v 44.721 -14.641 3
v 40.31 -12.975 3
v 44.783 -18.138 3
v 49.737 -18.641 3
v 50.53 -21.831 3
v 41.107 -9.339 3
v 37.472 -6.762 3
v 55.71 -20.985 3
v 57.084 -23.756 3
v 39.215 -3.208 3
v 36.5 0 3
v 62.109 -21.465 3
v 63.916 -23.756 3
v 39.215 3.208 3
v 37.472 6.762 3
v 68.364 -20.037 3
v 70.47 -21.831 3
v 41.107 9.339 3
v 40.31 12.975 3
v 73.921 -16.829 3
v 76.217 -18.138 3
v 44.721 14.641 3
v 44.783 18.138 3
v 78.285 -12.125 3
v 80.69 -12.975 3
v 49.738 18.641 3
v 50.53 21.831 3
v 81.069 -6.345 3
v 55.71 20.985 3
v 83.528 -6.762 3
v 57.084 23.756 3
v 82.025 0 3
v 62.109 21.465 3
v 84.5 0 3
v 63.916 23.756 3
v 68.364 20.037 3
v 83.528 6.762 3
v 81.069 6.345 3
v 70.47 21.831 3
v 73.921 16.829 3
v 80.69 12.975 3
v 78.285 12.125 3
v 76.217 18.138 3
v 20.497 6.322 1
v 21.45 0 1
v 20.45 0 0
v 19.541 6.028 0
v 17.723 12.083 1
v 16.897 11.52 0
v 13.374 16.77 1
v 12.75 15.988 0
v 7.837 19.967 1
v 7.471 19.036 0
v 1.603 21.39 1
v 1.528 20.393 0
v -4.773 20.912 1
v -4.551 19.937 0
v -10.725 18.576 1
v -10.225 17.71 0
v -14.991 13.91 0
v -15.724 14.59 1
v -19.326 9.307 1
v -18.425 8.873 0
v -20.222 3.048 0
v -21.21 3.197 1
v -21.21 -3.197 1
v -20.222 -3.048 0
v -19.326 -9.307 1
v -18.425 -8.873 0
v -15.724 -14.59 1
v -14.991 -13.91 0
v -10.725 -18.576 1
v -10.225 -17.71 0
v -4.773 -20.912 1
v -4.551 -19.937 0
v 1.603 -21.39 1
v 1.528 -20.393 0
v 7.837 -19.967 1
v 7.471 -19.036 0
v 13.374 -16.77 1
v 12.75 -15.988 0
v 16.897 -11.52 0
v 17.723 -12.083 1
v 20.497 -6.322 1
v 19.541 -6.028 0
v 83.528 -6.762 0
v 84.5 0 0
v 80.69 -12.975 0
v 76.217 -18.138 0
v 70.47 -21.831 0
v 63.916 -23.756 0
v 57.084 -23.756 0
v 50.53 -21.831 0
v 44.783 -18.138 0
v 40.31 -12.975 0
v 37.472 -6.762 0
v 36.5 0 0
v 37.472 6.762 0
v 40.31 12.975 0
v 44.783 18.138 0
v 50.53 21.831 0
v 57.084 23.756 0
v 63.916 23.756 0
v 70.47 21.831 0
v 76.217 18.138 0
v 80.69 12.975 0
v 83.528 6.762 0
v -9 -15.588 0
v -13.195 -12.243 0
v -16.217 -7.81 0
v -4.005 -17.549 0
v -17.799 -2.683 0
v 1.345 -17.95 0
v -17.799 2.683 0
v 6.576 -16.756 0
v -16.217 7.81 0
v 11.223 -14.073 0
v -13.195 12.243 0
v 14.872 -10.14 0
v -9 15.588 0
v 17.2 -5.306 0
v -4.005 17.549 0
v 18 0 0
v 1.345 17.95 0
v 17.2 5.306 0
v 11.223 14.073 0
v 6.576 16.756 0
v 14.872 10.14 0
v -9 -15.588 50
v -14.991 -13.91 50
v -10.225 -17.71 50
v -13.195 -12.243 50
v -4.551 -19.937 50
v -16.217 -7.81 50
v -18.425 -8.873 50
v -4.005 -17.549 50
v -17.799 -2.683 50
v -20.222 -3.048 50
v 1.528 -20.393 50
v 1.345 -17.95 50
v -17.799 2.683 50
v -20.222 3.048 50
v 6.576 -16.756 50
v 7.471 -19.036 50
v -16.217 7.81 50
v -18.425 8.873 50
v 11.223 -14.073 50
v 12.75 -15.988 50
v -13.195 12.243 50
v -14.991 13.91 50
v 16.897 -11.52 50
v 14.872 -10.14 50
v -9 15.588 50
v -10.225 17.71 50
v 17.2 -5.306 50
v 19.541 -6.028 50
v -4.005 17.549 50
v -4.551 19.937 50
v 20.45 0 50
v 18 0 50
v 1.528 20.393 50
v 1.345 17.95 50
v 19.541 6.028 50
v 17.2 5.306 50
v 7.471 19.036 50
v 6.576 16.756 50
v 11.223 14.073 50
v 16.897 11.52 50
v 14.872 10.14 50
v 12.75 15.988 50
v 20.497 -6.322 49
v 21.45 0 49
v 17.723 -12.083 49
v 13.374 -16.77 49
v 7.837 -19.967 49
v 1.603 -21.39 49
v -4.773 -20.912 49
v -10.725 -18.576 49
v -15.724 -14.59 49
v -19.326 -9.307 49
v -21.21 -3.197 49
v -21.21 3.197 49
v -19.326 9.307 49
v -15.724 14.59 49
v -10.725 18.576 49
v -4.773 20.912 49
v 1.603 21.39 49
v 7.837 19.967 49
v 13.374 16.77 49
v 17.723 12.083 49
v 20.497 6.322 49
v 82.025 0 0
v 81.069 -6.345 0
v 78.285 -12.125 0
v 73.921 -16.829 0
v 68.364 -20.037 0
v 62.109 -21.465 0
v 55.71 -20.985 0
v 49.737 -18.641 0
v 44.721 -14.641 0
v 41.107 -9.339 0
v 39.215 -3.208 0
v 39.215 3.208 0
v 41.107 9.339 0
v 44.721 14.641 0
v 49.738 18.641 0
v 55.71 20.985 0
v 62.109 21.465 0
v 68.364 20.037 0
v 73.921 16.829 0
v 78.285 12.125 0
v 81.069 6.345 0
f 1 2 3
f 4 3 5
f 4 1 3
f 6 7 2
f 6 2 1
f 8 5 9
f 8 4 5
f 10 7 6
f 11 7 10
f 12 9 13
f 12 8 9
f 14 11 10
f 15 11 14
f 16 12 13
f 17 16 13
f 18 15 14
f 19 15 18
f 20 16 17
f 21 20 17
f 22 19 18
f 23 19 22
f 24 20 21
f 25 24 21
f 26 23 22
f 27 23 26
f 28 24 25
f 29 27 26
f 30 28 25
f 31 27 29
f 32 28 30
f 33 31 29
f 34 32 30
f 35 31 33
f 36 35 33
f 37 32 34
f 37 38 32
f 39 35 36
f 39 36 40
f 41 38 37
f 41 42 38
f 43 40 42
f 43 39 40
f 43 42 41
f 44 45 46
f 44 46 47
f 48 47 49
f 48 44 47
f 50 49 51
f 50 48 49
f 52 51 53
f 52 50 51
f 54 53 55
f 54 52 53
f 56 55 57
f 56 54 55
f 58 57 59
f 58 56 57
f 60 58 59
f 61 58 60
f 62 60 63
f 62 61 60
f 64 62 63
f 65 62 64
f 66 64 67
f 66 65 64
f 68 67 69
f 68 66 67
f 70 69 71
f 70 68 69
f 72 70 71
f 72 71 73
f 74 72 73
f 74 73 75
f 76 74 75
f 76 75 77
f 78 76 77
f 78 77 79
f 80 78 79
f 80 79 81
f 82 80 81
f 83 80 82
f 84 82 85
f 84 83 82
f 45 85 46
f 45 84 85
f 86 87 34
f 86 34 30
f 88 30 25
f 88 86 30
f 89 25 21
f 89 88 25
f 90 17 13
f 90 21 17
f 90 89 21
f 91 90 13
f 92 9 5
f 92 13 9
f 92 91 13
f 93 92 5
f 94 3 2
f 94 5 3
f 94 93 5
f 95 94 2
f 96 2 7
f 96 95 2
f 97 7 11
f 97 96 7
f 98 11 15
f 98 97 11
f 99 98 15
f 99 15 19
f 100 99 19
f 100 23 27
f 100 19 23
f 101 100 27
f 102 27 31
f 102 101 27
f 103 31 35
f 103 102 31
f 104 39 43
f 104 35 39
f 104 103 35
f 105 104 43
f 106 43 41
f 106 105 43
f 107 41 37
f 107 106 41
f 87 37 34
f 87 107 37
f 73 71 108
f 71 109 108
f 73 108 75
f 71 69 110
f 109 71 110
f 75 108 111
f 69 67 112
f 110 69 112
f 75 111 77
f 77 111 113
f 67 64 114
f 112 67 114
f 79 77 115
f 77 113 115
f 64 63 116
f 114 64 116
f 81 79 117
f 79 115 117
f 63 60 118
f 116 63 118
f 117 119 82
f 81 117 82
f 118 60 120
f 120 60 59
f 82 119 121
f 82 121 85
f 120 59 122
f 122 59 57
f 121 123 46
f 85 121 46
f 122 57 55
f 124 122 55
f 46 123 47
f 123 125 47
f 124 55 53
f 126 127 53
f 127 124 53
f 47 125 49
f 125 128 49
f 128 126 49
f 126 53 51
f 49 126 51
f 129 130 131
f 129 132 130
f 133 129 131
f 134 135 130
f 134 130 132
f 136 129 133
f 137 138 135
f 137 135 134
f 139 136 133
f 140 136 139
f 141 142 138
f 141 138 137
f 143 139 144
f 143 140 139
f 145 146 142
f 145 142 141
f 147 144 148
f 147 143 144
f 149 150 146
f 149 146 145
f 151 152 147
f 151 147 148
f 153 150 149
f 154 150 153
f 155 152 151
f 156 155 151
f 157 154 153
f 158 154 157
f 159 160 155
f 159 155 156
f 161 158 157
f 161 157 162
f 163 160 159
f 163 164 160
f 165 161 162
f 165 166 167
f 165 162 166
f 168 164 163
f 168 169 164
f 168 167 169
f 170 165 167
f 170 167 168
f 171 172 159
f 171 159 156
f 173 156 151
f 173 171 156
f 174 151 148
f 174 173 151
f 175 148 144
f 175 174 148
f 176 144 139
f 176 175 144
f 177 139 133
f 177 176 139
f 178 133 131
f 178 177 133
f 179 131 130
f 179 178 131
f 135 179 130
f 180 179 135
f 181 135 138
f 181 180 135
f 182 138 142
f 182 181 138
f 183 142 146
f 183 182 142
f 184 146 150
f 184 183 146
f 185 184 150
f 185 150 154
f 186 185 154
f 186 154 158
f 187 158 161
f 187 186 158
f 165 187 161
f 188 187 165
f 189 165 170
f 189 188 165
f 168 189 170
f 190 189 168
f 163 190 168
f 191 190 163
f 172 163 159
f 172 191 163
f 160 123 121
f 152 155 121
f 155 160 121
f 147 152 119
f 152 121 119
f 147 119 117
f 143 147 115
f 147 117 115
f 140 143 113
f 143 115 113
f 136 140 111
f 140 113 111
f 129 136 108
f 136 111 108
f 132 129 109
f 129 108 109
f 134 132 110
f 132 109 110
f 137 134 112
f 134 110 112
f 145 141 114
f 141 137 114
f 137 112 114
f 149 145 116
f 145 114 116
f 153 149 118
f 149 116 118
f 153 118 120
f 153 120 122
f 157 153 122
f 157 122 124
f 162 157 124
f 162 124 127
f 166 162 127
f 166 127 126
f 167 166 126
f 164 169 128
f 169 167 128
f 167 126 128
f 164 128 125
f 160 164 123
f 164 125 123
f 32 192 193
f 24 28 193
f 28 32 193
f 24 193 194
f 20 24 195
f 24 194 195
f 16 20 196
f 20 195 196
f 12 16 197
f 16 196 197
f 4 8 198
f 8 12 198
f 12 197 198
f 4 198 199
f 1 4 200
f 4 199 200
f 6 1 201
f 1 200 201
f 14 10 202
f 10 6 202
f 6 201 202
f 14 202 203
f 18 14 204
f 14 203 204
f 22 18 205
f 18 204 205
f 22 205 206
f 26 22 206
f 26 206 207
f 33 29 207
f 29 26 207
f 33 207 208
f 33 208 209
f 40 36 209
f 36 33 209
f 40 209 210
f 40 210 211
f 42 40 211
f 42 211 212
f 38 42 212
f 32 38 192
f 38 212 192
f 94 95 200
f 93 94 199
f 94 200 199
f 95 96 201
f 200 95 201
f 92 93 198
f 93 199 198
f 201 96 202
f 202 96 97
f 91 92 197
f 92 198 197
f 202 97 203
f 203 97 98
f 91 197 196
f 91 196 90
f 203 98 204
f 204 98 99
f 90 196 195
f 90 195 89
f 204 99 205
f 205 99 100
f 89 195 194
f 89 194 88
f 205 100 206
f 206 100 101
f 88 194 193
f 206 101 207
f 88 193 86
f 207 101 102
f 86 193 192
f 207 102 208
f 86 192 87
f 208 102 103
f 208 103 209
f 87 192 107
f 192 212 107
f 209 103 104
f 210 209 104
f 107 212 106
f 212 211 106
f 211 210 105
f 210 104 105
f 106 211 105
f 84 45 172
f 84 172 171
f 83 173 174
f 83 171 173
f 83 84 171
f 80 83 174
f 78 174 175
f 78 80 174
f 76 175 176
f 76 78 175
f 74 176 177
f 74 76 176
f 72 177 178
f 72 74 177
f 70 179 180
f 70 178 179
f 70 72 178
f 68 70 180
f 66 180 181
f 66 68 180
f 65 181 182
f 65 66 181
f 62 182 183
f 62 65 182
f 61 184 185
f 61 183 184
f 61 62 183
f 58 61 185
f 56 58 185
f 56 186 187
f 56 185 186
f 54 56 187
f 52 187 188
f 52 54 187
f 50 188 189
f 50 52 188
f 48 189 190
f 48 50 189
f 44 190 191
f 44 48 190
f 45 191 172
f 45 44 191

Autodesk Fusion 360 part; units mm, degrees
sketch "Skizze14" plane through (0, 0, 0) normal (0, 0, 1) x (1, 0, 0)
  circle A0 centre (0, 0) radius 18
  circle A1 centre (0, 0) radius 21.45
extrude "Extrusion14" add sketch "Skizze14" along normal blind 50 makes body 1
sketch "Skizze15" plane through (0, 0, 0) normal (0, 0, 1) x (1, 0, 0)
  circle A0 centre (60.5, 0) radius 21.525
  circle A1 centre (60.5, 0) radius 24
extrude "Extrusion15" add sketch "Skizze15" along normal blind 3 separate body makes body 2
chamfer "Fase8" distance 1 angle 45 2 edges at (-19.9984, -7.7567, 50) (-19.9984, -7.7567, 0) on bodies 1
equation "outer_diameter = 43 mm" comment "Nenn-Außendurchmesser des Rohres (43mm)"
equation "outer_clearance = -0.10 mm" comment "Passungsspiel des Außendurchmessers (-0.10mm)"
equation "inner_diameter = 36 mm" comment "Innendurchmesser des Rohres (Kabelkanal)"
equation "pipe_length = 50 mm" comment "Gesamtlänge des Verbindungsrohres"
equation "ring_as_separate_body = 1" comment "Ring als separates Bauteil erzeugen (1 = Ja auf XY-Ebene, 0 = Nein/integriert)"
equation "ring_outer_diameter = 48 mm" comment "Außendurchmesser des Anschlagrings"
equation "ring_inner_diameter = 43 mm" comment "Nenn-Innendurchmesser des separaten Anschlagrings"
equation "ring_inner_clearance = 0.05 mm" comment "Passungsspiel/Aufmaß des Ring-Innendurchmessers (+0.05mm)"
equation "ring_length = 3 mm" comment "Länge des Anschlagrings"
equation "outer_chamfer = 1 mm" comment "Fase an den äußeren Endkanten des Rohres"
equation "d60 = pipe_length"
equation "d62 = ring_length"
equation "d64 = outer_chamfer"
